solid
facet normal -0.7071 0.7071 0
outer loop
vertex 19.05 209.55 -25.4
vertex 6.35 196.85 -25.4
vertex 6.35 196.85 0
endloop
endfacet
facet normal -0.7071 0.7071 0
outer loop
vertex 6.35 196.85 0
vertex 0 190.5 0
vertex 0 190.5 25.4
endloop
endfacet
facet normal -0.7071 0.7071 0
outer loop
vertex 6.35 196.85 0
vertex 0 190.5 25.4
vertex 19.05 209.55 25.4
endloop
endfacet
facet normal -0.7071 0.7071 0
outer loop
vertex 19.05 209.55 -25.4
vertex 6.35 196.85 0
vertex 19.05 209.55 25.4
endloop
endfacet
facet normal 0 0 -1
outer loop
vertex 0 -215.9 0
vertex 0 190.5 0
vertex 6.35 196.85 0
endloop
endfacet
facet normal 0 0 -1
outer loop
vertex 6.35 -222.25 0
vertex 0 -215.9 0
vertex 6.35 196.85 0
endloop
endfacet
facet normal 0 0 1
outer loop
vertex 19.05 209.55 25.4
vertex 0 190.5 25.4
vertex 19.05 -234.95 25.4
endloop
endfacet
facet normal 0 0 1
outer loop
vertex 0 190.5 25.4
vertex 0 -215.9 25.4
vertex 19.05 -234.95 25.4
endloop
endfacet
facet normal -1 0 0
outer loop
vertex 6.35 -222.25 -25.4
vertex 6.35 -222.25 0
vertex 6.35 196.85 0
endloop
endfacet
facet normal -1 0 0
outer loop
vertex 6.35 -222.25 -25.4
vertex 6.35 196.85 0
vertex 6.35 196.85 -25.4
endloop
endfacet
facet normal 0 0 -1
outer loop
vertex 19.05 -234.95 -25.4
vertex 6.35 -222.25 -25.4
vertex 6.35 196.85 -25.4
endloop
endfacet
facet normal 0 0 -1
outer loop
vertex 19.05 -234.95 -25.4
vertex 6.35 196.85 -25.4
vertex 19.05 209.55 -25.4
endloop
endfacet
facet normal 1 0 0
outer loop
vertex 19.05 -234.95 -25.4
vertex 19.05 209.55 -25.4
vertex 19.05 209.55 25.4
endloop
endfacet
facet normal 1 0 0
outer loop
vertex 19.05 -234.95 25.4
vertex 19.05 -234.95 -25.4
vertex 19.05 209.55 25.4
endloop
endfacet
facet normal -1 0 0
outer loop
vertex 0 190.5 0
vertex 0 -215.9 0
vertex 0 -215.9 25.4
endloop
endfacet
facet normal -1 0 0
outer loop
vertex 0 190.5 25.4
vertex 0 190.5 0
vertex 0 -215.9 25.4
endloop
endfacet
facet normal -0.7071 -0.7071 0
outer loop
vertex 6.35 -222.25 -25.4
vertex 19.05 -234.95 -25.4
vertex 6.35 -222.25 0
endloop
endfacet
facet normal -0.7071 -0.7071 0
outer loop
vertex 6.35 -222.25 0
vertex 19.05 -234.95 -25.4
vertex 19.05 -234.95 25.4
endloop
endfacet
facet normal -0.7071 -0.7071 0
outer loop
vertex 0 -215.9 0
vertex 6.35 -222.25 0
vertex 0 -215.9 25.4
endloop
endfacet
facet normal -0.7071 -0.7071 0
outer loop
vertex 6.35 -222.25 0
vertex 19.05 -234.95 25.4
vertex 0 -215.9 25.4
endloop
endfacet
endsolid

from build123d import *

# Parameters (mm, degrees)
F0_W     = 368.3
F0_H     = 50.8
F1_DEPTH = 19.05
F2_DEPTH = 50.8
F3_DEPTH = 25.4
F5_DEPTH = 444.501
F7_DEPTH = 50.801


with BuildPart() as f1:
    # F0 (on Right) → F1 (new body)
    with BuildSketch(Plane.YZ):
        Rectangle(F0_W, F0_H)
    extrude(amount=F1_DEPTH)

    # F2 (add): a face of the model
    f2_faces = [f1.faces().sort_by_distance(p)[0] for p in [
        (9.525, -184.15, 0),
    ]]
    extrude(f2_faces, amount=F2_DEPTH)

    # F3 (add): a face of the model
    f3_faces = [f1.faces().sort_by_distance(p)[0] for p in [
        (9.525, 184.15, 0),
    ]]
    extrude(f3_faces, amount=F3_DEPTH)

    # F4 (on face) → F5 (cut, through all)
    with BuildSketch(Plane(origin=(0, 209.55, 0), x_dir=(-1, 0, 0), z_dir=(0, 1, 0))):
        Polygon((-6.35, 0), (-6.35, -25.4), (-6.35, -26.9535556436), (8.1521905959, -26.9535556436), (8.1521905959, 0), align=None)
    extrude(amount=-F5_DEPTH, mode=Mode.SUBTRACT)

    # F6 (on face) → F7 (cut, through all)
    with BuildSketch(Plane.XY.offset(25.4)):
        Polygon((0, 190.5), (19.05, 209.55), (19.2840322852, 224.0246832371), (-11.843809858, 224.0246832371), (-11.843809858, 190.5), align=None)
        Polygon((19.05, -242.6750212908), (19.05, -234.95), (0, -215.9), (-3.5010655411, -215.9), (-3.5010655411, -242.6750212908), align=None)
    extrude(amount=-F7_DEPTH, mode=Mode.SUBTRACT)


solid = f1.part
